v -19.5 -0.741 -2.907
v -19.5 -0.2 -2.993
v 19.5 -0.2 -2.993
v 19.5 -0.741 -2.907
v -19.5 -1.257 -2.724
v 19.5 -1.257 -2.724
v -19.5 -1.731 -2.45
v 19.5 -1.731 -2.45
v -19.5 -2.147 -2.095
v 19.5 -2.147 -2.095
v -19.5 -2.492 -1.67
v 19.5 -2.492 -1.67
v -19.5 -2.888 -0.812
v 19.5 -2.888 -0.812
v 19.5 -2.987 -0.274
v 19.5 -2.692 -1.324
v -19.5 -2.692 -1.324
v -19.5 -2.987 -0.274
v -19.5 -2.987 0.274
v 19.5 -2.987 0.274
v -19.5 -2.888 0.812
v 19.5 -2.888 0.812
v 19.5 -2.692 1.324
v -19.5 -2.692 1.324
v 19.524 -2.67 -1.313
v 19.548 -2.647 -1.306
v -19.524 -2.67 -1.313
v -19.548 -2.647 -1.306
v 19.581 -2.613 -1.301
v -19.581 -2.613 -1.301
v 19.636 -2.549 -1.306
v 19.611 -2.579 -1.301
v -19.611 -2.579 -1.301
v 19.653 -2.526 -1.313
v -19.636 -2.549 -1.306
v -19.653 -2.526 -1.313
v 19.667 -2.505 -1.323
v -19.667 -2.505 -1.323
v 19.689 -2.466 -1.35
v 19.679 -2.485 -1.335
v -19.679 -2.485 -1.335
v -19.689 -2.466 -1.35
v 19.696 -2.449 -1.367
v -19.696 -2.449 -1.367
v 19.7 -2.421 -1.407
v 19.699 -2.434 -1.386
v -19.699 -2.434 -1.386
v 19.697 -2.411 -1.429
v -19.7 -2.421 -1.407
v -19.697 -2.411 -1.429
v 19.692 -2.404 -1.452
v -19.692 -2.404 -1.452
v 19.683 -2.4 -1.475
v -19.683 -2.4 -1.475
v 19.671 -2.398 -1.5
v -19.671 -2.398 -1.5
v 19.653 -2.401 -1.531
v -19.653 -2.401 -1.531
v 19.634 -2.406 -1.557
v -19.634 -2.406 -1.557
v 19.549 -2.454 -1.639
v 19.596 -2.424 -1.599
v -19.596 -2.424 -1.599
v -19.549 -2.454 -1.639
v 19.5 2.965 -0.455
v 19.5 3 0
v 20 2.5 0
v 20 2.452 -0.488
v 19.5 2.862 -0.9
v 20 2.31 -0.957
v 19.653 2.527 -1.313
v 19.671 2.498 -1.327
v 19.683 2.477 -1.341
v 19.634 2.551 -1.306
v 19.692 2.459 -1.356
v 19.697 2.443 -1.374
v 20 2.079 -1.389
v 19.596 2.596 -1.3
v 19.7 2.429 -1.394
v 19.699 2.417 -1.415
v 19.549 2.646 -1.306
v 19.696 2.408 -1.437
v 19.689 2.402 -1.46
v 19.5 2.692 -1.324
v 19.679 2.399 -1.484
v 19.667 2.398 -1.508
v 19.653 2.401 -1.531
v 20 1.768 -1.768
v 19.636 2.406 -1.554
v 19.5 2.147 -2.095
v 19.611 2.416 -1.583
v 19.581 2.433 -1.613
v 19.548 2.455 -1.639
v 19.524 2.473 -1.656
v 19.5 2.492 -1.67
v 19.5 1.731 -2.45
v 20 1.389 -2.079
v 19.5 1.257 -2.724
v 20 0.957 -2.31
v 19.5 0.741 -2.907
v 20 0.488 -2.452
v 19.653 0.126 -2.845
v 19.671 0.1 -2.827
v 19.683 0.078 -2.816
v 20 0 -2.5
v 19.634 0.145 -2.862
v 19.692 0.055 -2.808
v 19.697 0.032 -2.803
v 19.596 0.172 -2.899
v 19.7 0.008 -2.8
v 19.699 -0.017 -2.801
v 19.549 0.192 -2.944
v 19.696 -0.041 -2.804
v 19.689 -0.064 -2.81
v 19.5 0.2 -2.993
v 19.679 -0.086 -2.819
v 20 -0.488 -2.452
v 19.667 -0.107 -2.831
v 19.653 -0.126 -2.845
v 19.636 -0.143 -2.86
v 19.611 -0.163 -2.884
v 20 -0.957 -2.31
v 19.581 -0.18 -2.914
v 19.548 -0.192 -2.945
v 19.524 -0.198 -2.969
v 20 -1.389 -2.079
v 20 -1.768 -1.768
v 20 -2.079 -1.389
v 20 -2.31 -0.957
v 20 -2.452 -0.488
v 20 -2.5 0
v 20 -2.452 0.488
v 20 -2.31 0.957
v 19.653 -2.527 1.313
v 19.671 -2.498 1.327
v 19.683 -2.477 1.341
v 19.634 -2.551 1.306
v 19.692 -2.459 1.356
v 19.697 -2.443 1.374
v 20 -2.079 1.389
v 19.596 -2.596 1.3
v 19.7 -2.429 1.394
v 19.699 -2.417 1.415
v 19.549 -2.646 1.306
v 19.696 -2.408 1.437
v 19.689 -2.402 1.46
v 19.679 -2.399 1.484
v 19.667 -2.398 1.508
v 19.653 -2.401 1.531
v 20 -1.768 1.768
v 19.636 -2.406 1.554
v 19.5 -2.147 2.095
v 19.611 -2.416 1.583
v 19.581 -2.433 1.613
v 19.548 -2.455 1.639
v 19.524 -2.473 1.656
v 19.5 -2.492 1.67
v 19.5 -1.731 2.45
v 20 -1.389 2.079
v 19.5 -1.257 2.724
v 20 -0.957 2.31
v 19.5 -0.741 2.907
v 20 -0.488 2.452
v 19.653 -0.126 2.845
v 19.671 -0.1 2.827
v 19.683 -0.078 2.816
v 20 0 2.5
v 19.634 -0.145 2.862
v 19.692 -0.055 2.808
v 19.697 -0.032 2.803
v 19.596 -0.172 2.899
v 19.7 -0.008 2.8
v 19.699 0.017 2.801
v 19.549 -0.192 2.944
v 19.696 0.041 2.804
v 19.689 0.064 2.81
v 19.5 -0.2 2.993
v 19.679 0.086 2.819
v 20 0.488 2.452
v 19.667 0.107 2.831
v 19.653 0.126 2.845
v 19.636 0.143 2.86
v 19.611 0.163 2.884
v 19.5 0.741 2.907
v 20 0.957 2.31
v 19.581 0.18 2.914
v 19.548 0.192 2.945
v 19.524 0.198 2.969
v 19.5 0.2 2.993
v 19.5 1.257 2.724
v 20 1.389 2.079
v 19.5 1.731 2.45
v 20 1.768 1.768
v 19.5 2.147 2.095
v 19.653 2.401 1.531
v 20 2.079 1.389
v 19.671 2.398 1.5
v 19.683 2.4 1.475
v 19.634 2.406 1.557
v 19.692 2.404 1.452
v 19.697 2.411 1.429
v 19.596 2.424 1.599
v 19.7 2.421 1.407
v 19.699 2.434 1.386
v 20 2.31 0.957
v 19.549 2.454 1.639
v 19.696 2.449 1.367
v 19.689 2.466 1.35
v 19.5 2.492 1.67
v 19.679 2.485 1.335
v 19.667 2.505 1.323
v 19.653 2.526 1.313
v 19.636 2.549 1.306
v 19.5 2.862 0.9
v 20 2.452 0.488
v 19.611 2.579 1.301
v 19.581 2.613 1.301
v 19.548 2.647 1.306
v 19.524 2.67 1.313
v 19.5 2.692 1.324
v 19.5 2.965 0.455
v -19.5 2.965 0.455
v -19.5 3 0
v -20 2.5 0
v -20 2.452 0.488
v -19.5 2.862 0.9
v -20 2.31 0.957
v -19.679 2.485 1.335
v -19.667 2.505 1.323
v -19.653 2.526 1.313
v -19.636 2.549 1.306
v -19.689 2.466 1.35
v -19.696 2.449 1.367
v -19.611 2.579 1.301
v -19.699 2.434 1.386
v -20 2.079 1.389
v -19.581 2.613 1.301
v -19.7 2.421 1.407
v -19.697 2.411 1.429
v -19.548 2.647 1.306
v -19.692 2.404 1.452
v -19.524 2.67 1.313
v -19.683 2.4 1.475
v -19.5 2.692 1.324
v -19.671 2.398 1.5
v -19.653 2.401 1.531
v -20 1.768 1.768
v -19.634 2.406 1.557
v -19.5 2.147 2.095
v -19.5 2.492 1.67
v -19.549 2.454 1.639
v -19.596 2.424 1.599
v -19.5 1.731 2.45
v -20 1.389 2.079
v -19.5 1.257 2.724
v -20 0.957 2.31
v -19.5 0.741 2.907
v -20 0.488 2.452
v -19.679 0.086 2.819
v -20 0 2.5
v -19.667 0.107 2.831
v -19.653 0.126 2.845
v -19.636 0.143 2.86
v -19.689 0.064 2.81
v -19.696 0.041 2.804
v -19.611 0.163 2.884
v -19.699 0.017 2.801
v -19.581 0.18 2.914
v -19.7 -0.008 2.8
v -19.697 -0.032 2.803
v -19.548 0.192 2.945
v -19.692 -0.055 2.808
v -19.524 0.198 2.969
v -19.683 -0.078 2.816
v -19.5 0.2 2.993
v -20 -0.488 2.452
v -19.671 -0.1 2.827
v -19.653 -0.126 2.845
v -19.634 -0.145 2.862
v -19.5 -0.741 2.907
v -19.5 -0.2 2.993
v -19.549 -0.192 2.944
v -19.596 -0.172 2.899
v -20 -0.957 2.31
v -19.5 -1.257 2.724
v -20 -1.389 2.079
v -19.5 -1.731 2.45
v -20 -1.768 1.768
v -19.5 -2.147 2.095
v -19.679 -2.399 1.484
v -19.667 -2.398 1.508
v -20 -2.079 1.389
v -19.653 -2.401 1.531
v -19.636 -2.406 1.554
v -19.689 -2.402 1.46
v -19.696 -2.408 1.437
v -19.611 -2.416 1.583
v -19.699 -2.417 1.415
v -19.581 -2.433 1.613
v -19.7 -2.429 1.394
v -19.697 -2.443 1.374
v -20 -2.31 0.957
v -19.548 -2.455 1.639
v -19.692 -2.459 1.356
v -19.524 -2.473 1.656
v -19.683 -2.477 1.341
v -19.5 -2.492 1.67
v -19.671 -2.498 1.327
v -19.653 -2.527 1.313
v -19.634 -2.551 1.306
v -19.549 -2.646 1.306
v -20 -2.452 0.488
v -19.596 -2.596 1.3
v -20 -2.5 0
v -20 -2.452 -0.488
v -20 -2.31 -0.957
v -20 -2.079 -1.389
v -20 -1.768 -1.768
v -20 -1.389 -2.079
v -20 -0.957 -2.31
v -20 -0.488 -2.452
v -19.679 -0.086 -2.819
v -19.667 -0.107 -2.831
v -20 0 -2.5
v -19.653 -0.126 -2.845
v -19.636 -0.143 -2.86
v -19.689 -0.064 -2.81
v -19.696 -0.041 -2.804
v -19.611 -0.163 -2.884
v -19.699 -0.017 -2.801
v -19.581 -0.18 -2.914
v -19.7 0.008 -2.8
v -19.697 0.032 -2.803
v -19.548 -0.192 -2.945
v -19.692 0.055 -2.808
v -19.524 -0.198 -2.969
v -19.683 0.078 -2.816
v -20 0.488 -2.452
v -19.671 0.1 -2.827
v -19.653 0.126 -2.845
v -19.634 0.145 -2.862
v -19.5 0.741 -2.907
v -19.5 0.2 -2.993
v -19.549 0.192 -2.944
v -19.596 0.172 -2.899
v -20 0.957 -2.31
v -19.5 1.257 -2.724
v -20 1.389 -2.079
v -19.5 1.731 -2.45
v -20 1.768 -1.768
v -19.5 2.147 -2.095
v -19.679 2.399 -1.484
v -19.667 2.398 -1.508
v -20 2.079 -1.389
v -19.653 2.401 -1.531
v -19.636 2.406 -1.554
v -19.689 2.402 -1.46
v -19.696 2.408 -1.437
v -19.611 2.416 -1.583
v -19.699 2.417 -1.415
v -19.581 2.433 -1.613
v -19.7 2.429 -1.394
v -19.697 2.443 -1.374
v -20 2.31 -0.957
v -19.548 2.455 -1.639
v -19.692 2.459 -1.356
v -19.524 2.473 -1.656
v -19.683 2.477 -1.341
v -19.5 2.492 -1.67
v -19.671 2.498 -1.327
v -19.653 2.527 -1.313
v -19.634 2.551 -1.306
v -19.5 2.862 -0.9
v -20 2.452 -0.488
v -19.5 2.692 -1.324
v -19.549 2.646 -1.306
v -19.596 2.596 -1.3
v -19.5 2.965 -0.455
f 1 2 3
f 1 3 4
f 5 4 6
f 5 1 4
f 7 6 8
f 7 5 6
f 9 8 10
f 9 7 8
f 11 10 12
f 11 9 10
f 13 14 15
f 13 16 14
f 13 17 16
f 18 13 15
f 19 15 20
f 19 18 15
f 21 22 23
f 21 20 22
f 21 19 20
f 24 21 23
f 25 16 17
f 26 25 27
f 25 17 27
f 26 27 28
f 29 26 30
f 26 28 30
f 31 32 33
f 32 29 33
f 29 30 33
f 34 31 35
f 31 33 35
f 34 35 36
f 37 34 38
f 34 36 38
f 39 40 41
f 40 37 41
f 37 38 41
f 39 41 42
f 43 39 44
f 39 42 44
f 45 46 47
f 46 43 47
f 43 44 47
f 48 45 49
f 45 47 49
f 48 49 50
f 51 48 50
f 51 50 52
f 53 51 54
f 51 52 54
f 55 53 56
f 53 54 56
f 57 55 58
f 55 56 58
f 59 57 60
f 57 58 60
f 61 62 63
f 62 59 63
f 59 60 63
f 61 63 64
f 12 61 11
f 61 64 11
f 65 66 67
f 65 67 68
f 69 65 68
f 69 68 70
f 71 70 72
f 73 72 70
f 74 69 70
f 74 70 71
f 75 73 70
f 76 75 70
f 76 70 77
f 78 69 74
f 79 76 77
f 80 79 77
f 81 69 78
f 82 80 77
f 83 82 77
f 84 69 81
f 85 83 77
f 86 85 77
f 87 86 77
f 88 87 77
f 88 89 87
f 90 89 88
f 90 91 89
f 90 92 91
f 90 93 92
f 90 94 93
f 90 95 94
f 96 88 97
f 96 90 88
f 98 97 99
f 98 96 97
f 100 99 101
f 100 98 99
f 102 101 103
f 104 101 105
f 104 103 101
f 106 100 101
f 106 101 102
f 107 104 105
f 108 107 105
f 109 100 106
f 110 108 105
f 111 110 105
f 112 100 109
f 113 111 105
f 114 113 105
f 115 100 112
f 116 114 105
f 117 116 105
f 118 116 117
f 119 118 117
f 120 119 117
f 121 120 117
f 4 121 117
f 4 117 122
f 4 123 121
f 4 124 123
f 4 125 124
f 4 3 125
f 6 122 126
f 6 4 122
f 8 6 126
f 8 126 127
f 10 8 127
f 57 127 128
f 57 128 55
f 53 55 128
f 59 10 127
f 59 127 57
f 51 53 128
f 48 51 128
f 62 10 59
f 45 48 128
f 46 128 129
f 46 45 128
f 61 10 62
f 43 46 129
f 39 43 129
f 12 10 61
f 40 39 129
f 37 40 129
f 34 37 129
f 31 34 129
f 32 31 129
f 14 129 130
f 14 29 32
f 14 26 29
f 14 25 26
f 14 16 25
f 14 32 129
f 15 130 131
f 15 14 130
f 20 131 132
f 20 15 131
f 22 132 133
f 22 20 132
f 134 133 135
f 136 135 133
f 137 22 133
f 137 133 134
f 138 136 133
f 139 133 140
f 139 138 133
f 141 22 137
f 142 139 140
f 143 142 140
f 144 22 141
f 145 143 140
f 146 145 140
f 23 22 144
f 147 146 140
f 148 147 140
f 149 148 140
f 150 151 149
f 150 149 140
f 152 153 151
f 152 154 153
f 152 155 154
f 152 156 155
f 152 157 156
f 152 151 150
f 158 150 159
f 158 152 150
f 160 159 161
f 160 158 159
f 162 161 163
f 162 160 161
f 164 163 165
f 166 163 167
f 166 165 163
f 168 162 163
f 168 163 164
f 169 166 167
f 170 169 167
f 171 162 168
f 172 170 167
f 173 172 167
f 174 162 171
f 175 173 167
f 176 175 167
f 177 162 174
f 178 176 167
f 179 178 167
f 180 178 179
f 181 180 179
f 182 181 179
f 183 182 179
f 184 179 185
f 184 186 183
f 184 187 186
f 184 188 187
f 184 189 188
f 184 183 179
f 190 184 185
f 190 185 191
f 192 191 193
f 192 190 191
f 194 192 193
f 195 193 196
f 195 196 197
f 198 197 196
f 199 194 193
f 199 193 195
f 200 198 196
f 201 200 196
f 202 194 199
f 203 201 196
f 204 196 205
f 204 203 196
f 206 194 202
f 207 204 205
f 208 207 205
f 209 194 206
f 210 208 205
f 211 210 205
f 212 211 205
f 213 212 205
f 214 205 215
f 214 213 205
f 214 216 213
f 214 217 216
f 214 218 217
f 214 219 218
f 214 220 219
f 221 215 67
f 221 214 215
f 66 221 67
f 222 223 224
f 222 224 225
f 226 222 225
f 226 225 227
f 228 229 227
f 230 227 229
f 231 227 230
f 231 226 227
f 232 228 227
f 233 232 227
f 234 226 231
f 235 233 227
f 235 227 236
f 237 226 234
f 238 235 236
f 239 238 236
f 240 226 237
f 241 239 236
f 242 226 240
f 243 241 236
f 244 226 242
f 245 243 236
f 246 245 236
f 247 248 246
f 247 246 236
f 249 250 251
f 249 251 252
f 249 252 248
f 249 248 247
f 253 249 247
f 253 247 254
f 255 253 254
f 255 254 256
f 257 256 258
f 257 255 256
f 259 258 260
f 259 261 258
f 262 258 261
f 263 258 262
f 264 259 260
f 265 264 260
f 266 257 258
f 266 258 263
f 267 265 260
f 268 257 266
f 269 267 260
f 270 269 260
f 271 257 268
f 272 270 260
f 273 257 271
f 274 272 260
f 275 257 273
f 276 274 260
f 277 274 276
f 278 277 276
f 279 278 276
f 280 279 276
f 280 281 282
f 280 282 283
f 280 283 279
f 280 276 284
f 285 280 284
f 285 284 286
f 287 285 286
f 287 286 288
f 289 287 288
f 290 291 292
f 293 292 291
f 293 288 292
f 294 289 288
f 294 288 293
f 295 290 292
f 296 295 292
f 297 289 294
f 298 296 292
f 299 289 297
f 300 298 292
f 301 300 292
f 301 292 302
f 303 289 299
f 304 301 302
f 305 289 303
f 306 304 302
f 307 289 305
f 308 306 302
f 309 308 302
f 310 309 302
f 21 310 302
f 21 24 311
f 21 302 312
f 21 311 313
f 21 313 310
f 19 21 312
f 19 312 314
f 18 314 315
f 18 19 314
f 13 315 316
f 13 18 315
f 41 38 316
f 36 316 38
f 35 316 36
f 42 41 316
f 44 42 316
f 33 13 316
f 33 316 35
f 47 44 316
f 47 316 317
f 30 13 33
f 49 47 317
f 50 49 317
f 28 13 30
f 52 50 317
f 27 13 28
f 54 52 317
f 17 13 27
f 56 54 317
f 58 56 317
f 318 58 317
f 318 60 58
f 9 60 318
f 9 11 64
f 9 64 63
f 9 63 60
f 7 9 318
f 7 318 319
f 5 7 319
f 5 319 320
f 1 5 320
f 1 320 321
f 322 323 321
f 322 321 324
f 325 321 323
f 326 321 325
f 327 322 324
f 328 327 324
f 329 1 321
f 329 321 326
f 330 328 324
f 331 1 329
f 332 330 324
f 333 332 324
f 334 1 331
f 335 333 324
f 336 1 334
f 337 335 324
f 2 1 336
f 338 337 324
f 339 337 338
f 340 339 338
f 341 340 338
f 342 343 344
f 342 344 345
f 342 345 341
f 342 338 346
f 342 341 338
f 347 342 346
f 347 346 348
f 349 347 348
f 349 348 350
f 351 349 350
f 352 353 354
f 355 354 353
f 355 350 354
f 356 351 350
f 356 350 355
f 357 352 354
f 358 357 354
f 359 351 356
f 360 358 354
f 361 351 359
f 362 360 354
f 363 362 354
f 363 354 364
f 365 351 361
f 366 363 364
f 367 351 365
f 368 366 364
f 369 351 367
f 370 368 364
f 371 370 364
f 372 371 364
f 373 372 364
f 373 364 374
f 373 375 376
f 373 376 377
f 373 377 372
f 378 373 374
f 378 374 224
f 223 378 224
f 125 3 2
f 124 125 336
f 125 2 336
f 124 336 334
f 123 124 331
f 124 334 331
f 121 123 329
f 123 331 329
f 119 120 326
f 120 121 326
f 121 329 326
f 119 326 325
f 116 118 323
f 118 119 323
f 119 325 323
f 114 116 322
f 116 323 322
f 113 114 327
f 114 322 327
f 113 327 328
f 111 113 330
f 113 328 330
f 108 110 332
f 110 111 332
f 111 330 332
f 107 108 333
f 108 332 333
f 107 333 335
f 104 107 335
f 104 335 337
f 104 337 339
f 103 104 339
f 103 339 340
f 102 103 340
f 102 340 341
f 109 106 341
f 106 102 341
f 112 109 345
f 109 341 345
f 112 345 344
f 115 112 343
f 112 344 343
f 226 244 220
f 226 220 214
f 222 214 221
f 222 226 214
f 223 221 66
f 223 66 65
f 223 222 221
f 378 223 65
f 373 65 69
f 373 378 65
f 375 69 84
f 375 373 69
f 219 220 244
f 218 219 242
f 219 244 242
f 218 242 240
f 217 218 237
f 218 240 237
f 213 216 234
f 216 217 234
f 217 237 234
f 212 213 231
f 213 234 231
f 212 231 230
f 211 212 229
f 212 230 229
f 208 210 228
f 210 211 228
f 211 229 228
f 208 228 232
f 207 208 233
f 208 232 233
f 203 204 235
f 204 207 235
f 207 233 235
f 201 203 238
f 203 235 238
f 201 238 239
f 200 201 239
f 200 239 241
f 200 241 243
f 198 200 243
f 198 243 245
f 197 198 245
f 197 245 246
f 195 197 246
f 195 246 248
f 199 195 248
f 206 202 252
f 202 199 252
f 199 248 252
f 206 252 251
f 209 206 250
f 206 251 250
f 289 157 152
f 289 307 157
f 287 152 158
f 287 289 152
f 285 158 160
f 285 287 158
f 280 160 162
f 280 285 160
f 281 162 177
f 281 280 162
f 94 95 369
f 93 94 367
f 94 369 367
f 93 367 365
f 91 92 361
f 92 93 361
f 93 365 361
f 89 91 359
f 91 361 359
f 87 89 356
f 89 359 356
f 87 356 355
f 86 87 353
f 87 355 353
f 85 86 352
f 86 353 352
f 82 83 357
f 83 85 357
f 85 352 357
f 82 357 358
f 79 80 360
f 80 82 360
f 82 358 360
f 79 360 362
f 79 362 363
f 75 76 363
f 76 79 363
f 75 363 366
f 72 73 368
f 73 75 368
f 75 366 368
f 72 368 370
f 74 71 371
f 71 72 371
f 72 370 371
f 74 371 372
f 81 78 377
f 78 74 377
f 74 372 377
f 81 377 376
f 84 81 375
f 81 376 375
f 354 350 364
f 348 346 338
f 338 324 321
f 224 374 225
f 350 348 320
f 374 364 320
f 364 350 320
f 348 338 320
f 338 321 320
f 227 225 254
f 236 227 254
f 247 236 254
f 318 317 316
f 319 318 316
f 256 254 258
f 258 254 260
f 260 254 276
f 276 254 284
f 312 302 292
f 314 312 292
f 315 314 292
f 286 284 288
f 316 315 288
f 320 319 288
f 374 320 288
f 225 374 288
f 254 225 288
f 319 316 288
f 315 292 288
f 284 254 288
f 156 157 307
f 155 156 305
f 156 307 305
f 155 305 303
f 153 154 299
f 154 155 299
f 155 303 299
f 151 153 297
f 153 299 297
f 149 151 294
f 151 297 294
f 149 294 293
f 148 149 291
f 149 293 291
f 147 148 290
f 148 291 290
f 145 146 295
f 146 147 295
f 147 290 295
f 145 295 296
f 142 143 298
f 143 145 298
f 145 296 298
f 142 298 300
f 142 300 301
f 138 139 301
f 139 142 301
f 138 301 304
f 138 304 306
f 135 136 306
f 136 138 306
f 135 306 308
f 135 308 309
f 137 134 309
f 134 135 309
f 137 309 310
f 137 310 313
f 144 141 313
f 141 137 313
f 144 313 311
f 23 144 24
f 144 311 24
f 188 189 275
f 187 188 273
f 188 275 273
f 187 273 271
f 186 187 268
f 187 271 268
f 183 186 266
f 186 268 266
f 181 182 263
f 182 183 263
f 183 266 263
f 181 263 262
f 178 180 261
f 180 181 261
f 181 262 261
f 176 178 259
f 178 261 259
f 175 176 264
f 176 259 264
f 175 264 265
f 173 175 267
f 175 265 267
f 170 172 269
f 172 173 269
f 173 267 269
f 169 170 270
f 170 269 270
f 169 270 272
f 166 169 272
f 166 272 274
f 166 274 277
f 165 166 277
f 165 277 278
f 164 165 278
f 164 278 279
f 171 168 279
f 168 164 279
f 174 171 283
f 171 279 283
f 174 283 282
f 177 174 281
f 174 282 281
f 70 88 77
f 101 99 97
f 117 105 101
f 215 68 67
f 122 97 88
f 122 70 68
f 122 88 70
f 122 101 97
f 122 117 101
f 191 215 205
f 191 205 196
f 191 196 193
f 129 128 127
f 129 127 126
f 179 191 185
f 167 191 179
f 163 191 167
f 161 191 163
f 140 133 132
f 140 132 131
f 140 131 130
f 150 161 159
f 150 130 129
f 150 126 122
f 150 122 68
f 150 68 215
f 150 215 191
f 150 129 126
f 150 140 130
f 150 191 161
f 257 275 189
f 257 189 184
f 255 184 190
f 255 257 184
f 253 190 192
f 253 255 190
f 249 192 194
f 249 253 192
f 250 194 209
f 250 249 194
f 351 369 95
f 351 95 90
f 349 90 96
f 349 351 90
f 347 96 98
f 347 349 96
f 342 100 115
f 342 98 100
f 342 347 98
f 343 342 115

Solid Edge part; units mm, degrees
sketch "Sketch1" plane through (0, 0, 0) normal (1, 0, 0) x (0, 1, 0)
  circle A0 centre (0, 0) radius 3
extrude "Protrusion1" add sketch "Sketch1" along normal mid plane 40
chamfer "Chamfer_1" distance 0.5 angle 45 2 edges at (20, -3, 0) (-20, -3, 0)
sketch "Sketch2" plane through (0, 0, 0) normal (1, 0, 0) x (0, 1, 0)
  circle A0 centre (0, 3) radius 0.2
extrude "ExtrudedCutout_1" cut sketch "Sketch2" along normal mid plane 49.1824
pattern_circular "Pattern1" count 6 over 360 about axis through (0, 0, 0) along (-1, 0, 0) of "ExtrudedCutout_1"
